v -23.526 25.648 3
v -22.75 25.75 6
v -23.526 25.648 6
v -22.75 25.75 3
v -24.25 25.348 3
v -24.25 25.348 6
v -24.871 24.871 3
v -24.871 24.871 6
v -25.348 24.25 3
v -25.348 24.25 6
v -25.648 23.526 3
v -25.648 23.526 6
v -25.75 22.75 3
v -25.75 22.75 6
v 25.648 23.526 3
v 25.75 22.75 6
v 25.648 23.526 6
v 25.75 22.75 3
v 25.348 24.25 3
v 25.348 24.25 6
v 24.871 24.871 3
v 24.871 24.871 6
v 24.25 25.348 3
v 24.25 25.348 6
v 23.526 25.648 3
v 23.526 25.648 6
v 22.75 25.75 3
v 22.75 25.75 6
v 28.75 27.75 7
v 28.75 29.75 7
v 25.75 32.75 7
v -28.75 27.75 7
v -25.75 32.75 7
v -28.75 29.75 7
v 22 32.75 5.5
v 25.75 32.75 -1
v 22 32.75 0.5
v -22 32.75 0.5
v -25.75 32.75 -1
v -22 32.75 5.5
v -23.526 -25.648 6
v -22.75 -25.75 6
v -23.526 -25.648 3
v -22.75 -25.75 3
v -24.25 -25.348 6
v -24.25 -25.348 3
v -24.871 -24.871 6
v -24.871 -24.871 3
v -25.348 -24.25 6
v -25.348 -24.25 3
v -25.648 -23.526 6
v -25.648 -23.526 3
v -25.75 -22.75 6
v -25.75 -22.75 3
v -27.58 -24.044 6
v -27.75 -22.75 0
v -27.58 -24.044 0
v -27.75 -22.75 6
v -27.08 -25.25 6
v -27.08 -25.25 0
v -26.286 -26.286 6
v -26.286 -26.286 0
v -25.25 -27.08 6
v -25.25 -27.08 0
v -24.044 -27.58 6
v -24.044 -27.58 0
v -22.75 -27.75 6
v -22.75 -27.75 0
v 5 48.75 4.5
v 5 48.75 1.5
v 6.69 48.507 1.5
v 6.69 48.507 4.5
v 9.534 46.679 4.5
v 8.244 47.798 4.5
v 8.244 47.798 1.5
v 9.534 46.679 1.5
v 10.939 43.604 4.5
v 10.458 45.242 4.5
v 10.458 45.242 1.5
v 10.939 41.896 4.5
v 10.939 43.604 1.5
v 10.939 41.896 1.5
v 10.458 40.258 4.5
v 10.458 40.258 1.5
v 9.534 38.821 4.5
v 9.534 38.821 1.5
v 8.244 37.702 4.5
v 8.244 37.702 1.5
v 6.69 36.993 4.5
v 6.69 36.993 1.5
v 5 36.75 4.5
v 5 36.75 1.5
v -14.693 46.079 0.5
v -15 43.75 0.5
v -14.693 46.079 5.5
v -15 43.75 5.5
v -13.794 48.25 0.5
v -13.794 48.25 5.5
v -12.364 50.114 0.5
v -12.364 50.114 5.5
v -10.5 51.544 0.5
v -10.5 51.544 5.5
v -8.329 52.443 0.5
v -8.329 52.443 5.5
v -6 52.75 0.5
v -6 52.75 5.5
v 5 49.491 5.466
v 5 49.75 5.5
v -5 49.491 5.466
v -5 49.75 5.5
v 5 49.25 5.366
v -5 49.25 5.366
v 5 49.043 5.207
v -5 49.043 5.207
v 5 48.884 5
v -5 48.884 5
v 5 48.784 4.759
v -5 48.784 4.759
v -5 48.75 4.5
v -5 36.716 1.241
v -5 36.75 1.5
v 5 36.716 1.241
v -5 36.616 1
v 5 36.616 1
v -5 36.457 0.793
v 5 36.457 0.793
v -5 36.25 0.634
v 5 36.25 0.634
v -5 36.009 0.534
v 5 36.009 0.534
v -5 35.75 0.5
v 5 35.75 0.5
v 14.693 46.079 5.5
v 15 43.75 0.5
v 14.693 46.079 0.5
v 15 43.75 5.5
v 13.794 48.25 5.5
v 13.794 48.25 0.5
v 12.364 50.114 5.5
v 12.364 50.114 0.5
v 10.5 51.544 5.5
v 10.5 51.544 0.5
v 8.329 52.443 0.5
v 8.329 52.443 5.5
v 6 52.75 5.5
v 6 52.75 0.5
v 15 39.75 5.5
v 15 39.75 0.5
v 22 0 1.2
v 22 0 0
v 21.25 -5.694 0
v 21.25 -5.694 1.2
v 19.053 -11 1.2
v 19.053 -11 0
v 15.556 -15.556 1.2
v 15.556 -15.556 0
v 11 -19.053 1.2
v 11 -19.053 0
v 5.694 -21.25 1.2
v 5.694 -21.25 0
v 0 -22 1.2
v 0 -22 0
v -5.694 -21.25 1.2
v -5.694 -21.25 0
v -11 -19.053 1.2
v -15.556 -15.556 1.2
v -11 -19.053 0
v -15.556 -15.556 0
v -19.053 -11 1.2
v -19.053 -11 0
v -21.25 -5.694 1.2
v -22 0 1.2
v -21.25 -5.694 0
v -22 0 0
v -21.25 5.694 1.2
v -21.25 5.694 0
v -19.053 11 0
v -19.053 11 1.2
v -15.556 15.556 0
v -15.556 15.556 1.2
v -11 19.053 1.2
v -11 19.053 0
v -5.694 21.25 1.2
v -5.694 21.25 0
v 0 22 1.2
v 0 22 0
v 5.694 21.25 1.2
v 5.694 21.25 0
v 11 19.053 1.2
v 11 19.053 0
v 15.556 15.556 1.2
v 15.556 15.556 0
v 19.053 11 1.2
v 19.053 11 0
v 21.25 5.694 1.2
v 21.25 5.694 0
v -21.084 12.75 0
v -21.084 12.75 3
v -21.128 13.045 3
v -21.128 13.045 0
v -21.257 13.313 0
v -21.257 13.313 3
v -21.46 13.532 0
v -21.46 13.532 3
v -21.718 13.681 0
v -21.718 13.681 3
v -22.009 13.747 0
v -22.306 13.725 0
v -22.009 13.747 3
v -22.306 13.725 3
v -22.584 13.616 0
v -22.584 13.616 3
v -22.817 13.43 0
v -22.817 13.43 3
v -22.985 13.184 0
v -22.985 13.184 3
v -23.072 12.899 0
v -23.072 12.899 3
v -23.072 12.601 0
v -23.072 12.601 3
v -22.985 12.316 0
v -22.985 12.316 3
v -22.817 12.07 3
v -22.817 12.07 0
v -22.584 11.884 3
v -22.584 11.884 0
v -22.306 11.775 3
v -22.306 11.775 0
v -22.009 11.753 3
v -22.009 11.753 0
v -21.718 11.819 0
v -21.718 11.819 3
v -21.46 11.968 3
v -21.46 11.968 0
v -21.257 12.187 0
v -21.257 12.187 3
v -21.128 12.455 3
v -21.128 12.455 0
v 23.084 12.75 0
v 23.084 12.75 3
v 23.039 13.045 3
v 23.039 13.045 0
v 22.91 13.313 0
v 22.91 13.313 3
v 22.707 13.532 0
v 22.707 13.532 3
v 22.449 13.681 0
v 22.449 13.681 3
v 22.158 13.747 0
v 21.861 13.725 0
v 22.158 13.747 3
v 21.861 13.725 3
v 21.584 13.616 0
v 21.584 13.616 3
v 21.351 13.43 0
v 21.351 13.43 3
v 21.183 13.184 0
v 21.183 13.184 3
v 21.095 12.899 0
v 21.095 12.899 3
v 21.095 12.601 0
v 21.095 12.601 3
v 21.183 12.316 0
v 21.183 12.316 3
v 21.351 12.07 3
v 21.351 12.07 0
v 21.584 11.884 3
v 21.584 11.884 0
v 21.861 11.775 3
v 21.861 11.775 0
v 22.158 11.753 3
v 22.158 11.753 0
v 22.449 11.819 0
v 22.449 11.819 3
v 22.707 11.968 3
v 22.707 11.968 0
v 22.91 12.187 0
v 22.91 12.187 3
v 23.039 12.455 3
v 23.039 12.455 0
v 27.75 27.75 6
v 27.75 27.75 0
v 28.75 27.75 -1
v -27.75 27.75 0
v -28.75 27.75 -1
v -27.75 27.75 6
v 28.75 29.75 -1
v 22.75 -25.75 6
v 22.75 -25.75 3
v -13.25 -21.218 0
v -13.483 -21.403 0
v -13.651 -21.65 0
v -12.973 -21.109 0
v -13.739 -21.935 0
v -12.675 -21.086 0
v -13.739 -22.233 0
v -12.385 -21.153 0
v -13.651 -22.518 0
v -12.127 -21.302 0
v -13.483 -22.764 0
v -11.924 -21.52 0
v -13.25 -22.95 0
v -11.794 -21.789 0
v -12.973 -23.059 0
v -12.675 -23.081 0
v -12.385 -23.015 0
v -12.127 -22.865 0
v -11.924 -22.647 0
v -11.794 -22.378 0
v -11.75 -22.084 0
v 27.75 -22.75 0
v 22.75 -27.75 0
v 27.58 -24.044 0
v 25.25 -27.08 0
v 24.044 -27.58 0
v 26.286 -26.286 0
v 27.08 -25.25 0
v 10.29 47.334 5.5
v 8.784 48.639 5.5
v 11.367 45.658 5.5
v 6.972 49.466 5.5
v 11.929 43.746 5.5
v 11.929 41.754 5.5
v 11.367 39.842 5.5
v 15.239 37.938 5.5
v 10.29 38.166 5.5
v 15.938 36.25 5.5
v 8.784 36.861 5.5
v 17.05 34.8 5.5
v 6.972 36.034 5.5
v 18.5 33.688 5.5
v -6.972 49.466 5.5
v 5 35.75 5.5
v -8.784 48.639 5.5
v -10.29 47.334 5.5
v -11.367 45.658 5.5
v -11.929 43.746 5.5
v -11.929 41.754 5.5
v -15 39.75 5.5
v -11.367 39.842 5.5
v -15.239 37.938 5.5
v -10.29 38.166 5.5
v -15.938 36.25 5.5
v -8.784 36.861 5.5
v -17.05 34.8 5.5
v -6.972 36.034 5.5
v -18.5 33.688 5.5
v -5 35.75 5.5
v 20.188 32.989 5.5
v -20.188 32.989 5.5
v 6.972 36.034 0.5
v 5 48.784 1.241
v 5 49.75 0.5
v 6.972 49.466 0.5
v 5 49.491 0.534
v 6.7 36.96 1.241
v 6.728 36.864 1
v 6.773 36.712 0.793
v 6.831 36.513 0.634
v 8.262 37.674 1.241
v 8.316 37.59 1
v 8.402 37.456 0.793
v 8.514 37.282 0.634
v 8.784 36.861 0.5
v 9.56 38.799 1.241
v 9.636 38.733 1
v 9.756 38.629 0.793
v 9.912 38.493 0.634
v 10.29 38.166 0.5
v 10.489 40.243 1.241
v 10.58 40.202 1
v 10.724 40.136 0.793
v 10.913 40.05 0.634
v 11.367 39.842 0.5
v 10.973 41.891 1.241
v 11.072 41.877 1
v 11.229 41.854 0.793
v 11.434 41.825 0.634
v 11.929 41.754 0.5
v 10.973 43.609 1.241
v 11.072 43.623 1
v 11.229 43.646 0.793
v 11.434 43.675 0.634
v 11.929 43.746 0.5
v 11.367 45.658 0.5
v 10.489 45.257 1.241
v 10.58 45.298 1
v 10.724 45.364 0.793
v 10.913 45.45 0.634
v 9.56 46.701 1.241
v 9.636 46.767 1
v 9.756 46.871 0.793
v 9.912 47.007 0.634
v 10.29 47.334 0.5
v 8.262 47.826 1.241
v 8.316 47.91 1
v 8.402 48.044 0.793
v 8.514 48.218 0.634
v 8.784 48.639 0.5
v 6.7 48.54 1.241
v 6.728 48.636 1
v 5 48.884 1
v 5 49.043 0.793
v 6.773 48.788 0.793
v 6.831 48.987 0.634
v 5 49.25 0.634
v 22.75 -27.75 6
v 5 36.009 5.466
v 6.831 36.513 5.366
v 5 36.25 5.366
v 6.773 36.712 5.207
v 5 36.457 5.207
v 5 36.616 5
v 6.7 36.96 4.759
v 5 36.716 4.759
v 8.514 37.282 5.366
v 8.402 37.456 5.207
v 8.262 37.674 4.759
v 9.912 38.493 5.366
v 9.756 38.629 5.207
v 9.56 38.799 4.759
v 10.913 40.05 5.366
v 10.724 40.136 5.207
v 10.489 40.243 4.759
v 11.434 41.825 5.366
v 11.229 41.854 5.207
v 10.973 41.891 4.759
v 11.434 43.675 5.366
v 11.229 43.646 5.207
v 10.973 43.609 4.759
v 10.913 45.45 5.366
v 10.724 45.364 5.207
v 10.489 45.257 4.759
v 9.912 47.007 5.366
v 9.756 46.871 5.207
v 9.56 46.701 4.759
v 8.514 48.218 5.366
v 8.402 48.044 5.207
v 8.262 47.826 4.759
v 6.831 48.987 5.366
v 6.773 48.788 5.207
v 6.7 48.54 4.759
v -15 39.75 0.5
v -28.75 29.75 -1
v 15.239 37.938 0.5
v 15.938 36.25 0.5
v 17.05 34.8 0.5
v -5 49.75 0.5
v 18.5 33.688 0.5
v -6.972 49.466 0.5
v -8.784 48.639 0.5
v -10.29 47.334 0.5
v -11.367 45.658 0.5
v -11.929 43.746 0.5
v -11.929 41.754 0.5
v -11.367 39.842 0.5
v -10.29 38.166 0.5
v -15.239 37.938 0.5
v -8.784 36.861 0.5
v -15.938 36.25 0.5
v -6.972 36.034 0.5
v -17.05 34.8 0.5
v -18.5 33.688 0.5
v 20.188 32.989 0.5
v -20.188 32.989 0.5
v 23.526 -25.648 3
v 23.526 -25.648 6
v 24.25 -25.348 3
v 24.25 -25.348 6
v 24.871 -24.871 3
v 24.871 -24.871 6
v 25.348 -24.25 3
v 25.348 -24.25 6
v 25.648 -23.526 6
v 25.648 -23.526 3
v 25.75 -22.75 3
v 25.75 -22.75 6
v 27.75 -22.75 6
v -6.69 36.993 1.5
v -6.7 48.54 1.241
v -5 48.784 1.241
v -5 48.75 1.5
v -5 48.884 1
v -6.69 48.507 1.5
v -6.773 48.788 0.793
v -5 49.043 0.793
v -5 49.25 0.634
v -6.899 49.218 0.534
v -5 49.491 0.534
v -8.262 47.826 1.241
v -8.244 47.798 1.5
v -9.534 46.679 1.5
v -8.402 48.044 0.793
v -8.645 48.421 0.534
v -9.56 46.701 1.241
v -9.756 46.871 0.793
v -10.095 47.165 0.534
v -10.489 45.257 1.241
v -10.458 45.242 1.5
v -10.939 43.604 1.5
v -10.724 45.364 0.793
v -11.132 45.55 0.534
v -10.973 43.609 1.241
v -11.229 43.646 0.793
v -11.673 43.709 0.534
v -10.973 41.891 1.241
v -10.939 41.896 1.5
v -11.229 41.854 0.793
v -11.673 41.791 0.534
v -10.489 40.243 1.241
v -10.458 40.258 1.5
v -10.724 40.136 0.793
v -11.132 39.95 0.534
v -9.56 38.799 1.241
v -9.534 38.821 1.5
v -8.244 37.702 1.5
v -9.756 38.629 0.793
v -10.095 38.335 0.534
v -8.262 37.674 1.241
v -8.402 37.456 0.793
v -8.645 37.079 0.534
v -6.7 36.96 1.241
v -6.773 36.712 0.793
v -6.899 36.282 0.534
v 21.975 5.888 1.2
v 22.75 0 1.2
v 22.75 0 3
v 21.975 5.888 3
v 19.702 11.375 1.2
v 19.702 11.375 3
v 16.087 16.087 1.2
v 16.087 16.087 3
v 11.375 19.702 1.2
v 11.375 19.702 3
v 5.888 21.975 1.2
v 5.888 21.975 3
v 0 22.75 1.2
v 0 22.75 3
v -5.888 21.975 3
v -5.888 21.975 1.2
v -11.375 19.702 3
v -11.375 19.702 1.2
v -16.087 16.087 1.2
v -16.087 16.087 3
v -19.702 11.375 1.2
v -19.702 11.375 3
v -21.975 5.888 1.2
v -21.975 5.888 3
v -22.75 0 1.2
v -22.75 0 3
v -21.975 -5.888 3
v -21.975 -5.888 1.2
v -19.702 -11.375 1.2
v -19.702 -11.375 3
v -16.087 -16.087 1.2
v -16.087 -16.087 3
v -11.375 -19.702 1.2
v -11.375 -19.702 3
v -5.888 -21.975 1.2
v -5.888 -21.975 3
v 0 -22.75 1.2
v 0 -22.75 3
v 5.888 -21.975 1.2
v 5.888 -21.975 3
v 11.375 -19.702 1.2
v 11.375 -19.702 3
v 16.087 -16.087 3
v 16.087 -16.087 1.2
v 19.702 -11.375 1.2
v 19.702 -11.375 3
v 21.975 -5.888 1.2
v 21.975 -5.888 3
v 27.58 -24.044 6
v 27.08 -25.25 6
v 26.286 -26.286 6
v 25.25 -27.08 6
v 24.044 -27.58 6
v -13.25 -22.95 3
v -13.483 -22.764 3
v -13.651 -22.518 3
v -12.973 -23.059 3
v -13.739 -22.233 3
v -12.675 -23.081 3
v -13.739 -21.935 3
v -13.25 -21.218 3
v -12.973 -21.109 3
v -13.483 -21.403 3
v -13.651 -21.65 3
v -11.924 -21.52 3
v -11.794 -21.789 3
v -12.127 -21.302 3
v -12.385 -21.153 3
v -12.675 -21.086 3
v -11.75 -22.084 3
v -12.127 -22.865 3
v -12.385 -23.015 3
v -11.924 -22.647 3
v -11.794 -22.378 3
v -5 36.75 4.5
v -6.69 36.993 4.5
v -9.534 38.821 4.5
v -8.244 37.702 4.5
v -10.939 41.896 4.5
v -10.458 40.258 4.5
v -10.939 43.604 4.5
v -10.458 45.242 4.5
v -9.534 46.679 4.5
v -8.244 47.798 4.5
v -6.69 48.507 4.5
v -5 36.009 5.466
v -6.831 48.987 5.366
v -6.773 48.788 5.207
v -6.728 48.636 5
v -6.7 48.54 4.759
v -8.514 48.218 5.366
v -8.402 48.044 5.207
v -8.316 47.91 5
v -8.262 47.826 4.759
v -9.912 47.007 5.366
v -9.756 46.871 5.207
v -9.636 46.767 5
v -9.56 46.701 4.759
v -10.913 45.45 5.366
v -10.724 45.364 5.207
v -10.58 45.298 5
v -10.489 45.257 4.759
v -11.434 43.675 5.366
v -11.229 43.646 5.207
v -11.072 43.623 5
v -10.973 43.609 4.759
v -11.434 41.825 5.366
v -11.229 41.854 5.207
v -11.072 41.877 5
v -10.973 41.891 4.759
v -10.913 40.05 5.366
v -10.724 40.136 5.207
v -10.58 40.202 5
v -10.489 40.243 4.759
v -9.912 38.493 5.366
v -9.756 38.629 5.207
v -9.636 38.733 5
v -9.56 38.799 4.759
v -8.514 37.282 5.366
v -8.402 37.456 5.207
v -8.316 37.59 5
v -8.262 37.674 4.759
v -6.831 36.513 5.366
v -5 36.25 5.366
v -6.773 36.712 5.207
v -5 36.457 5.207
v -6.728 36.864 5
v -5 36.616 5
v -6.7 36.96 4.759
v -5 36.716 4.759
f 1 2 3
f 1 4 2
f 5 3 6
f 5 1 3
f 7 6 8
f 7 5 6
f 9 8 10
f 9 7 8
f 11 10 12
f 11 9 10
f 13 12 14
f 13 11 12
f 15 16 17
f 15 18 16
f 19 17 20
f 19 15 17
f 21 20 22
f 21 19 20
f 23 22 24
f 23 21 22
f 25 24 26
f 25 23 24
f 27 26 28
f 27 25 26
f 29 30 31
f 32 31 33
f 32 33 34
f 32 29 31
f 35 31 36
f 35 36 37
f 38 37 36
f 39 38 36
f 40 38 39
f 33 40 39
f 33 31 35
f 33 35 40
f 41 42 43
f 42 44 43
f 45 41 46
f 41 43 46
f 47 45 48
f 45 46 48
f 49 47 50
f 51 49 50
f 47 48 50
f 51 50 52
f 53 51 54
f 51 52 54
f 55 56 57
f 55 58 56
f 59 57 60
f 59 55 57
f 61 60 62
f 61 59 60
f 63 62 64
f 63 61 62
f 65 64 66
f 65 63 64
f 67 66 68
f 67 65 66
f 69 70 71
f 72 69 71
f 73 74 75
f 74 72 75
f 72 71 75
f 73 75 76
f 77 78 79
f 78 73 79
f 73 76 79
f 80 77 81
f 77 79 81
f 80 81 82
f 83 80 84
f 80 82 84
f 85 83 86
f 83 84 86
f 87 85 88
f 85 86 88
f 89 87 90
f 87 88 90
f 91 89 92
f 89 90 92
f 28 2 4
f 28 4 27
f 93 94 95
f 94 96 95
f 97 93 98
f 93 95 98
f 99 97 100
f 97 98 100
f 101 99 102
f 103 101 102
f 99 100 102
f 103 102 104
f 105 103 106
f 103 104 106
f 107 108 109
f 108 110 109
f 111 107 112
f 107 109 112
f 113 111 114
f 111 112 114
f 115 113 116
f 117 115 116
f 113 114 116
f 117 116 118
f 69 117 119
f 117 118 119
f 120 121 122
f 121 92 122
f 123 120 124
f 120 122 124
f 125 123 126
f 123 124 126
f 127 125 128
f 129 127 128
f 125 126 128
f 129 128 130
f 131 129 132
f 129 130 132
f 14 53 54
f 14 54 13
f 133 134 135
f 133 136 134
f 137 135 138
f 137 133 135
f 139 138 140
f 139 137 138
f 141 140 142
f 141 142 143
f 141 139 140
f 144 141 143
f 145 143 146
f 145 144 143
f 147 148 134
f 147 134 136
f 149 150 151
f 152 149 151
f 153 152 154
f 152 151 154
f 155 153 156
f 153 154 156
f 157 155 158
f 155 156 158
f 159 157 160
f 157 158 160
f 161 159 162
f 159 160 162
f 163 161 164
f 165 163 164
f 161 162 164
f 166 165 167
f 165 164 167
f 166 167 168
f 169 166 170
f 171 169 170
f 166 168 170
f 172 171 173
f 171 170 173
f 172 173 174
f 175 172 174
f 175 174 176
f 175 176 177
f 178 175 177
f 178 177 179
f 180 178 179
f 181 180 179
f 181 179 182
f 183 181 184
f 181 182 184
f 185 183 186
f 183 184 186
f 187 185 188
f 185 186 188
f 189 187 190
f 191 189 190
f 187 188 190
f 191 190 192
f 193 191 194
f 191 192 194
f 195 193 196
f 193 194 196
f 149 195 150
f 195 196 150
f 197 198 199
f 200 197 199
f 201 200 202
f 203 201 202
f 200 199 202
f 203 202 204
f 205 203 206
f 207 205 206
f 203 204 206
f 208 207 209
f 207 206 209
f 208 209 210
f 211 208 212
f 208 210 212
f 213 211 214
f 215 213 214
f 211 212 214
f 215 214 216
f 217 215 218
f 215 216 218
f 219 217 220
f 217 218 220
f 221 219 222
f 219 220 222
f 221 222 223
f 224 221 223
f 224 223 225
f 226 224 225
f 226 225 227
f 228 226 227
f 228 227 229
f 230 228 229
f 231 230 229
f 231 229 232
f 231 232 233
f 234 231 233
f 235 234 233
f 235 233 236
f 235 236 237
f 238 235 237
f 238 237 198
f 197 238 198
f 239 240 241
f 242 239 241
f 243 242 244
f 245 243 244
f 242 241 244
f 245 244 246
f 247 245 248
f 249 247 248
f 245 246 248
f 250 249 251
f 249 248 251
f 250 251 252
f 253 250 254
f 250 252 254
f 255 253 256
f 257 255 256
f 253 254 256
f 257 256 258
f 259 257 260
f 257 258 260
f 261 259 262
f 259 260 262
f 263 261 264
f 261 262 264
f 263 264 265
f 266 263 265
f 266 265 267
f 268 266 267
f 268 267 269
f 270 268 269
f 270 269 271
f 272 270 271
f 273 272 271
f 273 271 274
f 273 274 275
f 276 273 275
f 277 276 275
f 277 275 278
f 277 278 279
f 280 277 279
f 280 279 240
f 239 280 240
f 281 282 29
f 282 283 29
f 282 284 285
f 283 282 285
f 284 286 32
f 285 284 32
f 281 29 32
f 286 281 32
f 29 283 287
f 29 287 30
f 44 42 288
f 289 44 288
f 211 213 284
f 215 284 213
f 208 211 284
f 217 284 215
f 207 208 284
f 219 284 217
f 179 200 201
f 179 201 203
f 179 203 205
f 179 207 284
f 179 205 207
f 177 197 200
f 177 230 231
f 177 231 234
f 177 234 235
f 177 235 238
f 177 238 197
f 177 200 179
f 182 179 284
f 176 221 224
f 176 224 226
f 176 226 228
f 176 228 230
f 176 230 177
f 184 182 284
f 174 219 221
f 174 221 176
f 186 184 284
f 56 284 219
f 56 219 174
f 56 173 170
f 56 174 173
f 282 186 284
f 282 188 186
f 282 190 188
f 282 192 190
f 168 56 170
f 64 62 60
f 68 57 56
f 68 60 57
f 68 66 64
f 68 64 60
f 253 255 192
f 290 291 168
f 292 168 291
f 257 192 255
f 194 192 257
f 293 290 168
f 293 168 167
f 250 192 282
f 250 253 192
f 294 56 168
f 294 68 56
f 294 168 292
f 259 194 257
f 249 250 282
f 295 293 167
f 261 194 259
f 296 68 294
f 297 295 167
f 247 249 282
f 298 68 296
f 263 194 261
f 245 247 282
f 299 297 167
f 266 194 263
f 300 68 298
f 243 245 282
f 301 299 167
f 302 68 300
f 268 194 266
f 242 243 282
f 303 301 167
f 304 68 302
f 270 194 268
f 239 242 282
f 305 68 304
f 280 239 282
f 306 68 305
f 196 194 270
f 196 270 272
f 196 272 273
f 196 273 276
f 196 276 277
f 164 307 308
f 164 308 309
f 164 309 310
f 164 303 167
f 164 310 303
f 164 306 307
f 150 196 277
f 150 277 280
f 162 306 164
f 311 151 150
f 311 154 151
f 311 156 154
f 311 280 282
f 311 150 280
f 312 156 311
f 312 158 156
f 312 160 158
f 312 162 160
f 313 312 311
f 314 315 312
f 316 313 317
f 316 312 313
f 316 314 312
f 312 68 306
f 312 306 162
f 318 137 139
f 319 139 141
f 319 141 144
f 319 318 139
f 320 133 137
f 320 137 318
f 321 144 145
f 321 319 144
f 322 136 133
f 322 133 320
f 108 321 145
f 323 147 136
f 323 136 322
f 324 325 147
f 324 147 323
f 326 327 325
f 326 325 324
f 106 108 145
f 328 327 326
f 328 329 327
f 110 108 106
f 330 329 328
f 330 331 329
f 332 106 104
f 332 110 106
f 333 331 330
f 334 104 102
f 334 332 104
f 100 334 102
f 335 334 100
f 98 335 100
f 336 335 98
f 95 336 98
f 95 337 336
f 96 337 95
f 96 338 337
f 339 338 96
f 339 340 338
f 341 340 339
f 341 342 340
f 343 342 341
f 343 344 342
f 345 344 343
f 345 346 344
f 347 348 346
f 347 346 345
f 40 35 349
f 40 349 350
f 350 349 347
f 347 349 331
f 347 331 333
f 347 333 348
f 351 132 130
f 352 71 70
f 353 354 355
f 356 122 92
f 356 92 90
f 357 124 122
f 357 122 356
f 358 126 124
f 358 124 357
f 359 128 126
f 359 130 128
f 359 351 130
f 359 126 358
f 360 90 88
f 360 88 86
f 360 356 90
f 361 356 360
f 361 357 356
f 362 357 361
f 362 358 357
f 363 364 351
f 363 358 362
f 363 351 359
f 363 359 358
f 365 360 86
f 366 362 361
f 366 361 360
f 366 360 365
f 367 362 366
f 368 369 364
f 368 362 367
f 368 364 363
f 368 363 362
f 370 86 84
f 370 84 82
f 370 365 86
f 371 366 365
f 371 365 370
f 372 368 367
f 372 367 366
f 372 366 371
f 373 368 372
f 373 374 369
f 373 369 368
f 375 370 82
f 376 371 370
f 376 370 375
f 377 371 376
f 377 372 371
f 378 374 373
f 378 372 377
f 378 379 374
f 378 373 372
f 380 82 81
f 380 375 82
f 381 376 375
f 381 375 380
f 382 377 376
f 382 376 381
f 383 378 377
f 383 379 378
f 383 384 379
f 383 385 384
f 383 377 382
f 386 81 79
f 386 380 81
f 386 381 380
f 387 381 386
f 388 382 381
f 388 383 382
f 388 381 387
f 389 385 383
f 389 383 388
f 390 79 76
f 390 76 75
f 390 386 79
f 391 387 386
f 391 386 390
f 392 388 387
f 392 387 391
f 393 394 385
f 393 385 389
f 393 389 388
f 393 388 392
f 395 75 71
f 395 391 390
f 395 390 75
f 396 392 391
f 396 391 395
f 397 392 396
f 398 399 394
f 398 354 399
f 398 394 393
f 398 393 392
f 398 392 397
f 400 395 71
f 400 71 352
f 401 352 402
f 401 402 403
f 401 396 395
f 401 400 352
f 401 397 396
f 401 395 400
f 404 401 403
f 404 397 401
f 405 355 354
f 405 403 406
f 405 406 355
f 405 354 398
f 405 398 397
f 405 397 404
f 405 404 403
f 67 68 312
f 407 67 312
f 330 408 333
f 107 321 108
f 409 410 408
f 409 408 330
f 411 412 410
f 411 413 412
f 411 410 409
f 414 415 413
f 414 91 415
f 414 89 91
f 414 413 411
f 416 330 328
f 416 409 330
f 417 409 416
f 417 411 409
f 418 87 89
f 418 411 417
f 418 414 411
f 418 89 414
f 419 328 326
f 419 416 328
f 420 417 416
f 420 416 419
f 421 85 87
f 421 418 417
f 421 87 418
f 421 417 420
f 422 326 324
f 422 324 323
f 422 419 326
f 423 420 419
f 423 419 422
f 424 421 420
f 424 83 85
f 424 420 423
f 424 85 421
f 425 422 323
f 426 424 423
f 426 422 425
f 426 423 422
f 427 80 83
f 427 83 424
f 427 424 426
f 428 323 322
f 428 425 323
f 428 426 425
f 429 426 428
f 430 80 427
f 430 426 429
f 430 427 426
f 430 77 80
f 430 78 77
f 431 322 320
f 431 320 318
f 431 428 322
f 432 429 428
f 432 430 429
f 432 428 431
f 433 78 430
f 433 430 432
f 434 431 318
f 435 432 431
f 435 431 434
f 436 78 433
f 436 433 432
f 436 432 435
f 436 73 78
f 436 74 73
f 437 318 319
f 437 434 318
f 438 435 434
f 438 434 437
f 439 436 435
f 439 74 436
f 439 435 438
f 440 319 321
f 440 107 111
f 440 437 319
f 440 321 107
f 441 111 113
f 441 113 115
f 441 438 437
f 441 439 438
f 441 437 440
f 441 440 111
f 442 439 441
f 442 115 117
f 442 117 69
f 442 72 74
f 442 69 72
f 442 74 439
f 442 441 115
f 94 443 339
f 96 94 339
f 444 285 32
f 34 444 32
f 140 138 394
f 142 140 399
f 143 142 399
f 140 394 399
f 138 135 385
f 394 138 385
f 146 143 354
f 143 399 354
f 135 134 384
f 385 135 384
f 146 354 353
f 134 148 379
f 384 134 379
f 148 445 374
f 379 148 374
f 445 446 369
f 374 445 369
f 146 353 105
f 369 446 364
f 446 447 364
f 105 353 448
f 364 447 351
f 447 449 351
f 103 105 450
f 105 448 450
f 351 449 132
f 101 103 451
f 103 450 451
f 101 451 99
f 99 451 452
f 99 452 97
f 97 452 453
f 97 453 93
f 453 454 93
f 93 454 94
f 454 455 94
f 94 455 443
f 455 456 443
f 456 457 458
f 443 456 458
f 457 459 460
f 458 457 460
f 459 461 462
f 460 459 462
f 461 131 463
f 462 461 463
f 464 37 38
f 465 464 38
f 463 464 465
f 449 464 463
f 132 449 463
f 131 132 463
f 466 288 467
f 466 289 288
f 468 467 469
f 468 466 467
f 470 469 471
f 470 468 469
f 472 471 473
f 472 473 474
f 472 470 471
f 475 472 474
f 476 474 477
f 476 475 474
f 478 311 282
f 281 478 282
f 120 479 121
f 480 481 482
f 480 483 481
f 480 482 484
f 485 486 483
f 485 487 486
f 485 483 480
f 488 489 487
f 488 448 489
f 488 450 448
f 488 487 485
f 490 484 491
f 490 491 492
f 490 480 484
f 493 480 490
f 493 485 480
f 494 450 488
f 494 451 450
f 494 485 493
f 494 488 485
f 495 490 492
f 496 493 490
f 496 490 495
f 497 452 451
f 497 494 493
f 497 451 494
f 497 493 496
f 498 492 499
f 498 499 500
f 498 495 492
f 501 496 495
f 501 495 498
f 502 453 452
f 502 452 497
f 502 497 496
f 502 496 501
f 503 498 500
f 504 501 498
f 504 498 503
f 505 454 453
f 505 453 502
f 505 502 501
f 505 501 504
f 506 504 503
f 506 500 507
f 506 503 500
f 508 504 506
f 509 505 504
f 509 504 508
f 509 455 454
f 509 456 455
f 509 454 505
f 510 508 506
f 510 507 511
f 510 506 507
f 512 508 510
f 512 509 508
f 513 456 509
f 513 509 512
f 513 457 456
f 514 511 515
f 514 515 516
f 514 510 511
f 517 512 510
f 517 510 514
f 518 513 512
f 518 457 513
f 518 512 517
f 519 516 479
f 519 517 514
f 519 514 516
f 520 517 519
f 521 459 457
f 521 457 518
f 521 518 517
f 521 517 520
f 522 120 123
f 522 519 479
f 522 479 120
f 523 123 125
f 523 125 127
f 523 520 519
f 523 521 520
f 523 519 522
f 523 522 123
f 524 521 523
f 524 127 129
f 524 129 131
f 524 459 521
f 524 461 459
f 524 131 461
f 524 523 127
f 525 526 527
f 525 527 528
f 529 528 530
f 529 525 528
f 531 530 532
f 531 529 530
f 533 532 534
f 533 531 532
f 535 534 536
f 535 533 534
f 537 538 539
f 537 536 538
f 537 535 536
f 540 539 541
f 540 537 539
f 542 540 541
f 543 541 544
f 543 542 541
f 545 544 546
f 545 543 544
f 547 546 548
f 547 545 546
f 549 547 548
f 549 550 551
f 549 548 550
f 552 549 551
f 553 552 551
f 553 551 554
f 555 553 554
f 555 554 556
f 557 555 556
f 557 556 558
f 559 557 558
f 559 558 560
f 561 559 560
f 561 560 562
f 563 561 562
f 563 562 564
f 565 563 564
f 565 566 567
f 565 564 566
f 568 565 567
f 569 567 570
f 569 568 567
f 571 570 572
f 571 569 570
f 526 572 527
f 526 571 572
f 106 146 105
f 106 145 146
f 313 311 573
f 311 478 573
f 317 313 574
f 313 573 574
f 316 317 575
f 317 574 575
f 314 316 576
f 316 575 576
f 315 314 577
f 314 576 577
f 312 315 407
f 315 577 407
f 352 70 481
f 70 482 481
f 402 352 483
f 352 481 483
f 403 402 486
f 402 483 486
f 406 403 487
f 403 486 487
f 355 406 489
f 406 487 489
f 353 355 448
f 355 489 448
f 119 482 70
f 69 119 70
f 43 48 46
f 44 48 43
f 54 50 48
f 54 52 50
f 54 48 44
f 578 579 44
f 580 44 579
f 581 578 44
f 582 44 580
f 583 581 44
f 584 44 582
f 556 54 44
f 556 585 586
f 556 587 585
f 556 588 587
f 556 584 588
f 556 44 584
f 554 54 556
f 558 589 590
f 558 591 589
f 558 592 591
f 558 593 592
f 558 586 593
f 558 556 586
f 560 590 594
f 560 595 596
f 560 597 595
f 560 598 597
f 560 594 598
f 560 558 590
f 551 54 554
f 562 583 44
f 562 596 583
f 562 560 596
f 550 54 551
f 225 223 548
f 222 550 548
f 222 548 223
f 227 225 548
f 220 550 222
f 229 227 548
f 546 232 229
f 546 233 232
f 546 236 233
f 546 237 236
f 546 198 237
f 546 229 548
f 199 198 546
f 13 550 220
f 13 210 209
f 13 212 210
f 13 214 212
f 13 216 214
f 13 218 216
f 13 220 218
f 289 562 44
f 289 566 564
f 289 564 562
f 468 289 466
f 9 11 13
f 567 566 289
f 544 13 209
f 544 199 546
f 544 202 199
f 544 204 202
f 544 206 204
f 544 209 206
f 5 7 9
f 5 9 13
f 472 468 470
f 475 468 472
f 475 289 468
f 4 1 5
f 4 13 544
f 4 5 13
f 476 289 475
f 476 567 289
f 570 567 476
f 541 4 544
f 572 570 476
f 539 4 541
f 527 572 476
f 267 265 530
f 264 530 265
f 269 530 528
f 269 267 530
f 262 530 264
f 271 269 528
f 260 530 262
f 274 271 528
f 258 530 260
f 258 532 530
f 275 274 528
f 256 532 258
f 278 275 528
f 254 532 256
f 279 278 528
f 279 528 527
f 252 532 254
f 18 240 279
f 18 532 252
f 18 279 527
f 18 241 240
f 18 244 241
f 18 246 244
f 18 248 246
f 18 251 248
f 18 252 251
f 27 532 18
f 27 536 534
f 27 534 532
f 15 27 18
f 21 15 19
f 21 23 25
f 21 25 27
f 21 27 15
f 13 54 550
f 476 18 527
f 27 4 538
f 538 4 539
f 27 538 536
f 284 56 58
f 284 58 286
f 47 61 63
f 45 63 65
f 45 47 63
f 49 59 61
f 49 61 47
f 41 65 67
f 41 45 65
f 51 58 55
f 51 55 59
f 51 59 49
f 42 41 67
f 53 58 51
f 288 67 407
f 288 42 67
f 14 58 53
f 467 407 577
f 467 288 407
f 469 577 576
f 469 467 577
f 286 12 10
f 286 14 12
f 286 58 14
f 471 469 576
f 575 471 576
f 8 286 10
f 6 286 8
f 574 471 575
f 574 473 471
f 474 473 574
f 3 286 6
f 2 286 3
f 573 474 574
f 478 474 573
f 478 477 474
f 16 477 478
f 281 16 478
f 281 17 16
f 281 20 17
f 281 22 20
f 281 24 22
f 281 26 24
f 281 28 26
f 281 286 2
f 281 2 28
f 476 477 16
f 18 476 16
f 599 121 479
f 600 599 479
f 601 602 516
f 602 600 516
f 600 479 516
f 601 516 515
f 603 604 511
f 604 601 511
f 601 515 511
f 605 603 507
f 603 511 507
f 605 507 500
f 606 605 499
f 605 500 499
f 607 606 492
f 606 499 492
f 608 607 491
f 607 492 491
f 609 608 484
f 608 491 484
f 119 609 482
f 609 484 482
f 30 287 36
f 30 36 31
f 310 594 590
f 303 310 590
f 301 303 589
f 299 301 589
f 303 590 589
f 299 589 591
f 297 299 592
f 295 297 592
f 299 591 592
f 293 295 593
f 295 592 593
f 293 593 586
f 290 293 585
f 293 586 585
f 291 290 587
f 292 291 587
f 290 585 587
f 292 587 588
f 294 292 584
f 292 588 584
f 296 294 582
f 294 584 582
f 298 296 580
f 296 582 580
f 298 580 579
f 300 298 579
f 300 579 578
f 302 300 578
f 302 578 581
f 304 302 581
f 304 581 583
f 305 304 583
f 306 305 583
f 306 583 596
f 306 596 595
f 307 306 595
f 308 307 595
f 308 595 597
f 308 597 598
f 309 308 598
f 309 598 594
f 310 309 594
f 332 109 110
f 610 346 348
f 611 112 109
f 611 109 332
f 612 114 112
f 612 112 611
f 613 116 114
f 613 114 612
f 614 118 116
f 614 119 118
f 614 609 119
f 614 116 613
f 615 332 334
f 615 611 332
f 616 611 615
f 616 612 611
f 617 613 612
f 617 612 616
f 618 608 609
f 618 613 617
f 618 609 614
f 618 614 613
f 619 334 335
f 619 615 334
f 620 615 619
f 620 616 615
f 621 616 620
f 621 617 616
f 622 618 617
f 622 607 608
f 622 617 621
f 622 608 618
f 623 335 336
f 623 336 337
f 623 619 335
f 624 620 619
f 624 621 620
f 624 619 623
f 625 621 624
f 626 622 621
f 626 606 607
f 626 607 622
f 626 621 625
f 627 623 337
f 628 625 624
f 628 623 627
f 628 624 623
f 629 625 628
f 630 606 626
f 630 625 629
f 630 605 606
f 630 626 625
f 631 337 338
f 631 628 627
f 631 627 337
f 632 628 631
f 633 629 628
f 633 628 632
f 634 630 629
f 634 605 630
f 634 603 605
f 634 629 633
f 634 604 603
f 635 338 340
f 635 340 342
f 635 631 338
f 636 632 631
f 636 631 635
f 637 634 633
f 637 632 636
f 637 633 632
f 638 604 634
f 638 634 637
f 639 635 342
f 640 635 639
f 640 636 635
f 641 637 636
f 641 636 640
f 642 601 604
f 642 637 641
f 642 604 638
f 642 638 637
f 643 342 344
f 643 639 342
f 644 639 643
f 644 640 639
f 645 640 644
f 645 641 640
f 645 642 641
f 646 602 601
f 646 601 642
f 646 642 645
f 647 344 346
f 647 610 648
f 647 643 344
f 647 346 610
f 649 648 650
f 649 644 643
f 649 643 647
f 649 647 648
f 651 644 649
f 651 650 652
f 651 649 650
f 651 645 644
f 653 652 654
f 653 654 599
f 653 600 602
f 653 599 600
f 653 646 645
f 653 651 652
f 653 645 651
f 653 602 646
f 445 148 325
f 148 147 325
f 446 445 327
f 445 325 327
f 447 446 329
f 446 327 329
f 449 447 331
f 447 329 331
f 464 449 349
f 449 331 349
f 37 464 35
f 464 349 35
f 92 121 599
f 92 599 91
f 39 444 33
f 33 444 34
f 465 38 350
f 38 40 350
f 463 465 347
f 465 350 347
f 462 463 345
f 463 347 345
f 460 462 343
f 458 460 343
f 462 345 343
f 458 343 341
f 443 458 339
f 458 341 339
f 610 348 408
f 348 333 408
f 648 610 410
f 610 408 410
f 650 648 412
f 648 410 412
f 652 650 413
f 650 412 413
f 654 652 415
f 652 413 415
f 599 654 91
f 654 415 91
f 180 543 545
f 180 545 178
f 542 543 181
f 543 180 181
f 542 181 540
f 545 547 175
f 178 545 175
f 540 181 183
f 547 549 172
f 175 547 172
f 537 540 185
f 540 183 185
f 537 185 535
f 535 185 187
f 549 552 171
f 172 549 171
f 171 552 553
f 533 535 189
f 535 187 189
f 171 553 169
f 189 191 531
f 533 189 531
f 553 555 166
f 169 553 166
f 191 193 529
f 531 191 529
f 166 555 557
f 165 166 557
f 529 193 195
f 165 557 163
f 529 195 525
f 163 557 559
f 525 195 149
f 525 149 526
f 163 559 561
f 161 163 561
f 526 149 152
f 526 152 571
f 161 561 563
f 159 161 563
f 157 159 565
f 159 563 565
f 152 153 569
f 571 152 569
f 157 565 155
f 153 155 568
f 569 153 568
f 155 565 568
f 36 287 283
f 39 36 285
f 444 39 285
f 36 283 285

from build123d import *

# Parameters (mm, degrees)
SKETCH_W        = 55.5
SKETCH_H        = 55.5
SKETCH_R        = 22.75
PAD_DEPTH       = 6
SKETCH001_W     = 57.5
SKETCH001_H     = 8
PAD001_DEPTH    = 5
SKETCH002_W     = 30
SKETCH002_H     = 5
PAD002_DEPTH    = 20
FILLET_R        = 5
POCKET_DEPTH    = 6
FILLET001_R     = 9
FILLET002_R     = 7
CHAMFER_SIZE    = 3
SKETCH004_R     = 22.75
SKETCH004_R_2   = 22
PAD003_DEPTH    = 1.2
SKETCH005_W     = 51.5
SKETCH005_H     = 51.5
POCKET001_DEPTH = 3
SKETCH006_R     = 1
POCKET002_DEPTH = 6
FILLET003_R     = 1
FILLET004_R     = 1
FILLET005_R     = 3


with BuildPart() as part:
    # Sketch → Pad (new body)
    with BuildSketch(Plane.XY):
        Rectangle(SKETCH_W, SKETCH_H)
        Circle(SKETCH_R, mode=Mode.SUBTRACT)
    extrude(amount=PAD_DEPTH)

    # Sketch001 → Pad001 (new body)
    with BuildSketch(Plane(origin=(0, 27.75, 0), x_dir=(-1, 0, 0), z_dir=(0, 1, 0))):
        with Locations((0, 3)):
            Rectangle(SKETCH001_W, SKETCH001_H)
    extrude(amount=PAD001_DEPTH)

    # Sketch002 → Pad002 (new body)
    with BuildSketch(Plane(origin=(0, 32.75, 0), x_dir=(-1, 0, 0), z_dir=(0, 1, 0))):
        with Locations((0, 3)):
            Rectangle(SKETCH002_W, SKETCH002_H)
    extrude(amount=PAD002_DEPTH)

    # Fillet
    fillet_edges = [part.edges().sort_by_distance(p)[0] for p in [
        (-27.75, -27.75, 3),
        (27.75, -27.75, 3),
    ]]
    fillet(fillet_edges, radius=FILLET_R)

    # Sketch003 → Pocket (cut)
    with BuildSketch(Plane(origin=(0, 0, 0.5), x_dir=(1, 0, 0), z_dir=(0, 0, -1))):
        with BuildLine():
            ThreePointArc((-5, -36.75), (-11, -42.75), (-5, -48.75))
            Line((-5, -48.75), (5, -48.75))
            ThreePointArc((5, -48.75), (11, -42.75), (5, -36.75))
            Line((-5, -36.75), (5, -36.75))
        make_face()
    extrude(amount=-POCKET_DEPTH, mode=Mode.SUBTRACT)

    # Fillet001
    fillet001_edges = [part.edges().sort_by_distance(p)[0] for p in [
        (15, 52.75, 3),
        (-15, 52.75, 3),
    ]]
    fillet(fillet001_edges, radius=FILLET001_R)

    # Fillet002
    fillet002_edges = [part.edges().sort_by_distance(p)[0] for p in [
        (15, 32.75, 3),
        (-15, 32.75, 3),
    ]]
    fillet(fillet002_edges, radius=FILLET002_R)

    # Chamfer
    chamfer_edges = [part.edges().sort_by_distance(p)[0] for p in [
        (-28.75, 32.75, 3),
        (28.75, 32.75, 3),
    ]]
    chamfer(chamfer_edges, length=CHAMFER_SIZE)

    # Sketch004 → Pad003 (new body)
    with BuildSketch(Plane(origin=(0, 0, 0), x_dir=(1, 0, 0), z_dir=(0, 0, -1))):
        Circle(SKETCH004_R)
        Circle(SKETCH004_R_2, mode=Mode.SUBTRACT)
    extrude(amount=-PAD003_DEPTH)

    # Sketch005 → Pocket001 (cut)
    with BuildSketch(Plane.XY.offset(6)):
        Rectangle(SKETCH005_W, SKETCH005_H)
    extrude(amount=-POCKET001_DEPTH, mode=Mode.SUBTRACT)

    # Sketch006 → Pocket002 (cut)
    with BuildSketch(Plane.XY.offset(3)):
        with Locations((-22.083648, 12.75)):
            Circle(SKETCH006_R)
        with Locations((22.083648, 12.75)):
            Circle(SKETCH006_R)
        with Locations((-12.75, -22.083648)):
            Circle(SKETCH006_R)
    extrude(amount=-POCKET002_DEPTH, mode=Mode.SUBTRACT)

    # Fillet003
    fillet003_edges = [part.edges().sort_by_distance(p)[0] for p in [
        (0, 48.75, 5.5),
    ]]
    fillet(fillet003_edges, radius=FILLET003_R)

    # Fillet004
    fillet004_edges = [part.edges().sort_by_distance(p)[0] for p in [
        (0, 36.75, 0.5),
    ]]
    fillet(fillet004_edges, radius=FILLET004_R)

    # Fillet005
    fillet005_edges = [part.edges().sort_by_distance(p)[0] for p in [
        (-25.75, -25.75, 4.5),
        (25.75, -25.75, 4.5),
        (25.75, 25.75, 4.5),
        (-25.75, 25.75, 4.5),
    ]]
    fillet(fillet005_edges, radius=FILLET005_R)


solid = part.part
